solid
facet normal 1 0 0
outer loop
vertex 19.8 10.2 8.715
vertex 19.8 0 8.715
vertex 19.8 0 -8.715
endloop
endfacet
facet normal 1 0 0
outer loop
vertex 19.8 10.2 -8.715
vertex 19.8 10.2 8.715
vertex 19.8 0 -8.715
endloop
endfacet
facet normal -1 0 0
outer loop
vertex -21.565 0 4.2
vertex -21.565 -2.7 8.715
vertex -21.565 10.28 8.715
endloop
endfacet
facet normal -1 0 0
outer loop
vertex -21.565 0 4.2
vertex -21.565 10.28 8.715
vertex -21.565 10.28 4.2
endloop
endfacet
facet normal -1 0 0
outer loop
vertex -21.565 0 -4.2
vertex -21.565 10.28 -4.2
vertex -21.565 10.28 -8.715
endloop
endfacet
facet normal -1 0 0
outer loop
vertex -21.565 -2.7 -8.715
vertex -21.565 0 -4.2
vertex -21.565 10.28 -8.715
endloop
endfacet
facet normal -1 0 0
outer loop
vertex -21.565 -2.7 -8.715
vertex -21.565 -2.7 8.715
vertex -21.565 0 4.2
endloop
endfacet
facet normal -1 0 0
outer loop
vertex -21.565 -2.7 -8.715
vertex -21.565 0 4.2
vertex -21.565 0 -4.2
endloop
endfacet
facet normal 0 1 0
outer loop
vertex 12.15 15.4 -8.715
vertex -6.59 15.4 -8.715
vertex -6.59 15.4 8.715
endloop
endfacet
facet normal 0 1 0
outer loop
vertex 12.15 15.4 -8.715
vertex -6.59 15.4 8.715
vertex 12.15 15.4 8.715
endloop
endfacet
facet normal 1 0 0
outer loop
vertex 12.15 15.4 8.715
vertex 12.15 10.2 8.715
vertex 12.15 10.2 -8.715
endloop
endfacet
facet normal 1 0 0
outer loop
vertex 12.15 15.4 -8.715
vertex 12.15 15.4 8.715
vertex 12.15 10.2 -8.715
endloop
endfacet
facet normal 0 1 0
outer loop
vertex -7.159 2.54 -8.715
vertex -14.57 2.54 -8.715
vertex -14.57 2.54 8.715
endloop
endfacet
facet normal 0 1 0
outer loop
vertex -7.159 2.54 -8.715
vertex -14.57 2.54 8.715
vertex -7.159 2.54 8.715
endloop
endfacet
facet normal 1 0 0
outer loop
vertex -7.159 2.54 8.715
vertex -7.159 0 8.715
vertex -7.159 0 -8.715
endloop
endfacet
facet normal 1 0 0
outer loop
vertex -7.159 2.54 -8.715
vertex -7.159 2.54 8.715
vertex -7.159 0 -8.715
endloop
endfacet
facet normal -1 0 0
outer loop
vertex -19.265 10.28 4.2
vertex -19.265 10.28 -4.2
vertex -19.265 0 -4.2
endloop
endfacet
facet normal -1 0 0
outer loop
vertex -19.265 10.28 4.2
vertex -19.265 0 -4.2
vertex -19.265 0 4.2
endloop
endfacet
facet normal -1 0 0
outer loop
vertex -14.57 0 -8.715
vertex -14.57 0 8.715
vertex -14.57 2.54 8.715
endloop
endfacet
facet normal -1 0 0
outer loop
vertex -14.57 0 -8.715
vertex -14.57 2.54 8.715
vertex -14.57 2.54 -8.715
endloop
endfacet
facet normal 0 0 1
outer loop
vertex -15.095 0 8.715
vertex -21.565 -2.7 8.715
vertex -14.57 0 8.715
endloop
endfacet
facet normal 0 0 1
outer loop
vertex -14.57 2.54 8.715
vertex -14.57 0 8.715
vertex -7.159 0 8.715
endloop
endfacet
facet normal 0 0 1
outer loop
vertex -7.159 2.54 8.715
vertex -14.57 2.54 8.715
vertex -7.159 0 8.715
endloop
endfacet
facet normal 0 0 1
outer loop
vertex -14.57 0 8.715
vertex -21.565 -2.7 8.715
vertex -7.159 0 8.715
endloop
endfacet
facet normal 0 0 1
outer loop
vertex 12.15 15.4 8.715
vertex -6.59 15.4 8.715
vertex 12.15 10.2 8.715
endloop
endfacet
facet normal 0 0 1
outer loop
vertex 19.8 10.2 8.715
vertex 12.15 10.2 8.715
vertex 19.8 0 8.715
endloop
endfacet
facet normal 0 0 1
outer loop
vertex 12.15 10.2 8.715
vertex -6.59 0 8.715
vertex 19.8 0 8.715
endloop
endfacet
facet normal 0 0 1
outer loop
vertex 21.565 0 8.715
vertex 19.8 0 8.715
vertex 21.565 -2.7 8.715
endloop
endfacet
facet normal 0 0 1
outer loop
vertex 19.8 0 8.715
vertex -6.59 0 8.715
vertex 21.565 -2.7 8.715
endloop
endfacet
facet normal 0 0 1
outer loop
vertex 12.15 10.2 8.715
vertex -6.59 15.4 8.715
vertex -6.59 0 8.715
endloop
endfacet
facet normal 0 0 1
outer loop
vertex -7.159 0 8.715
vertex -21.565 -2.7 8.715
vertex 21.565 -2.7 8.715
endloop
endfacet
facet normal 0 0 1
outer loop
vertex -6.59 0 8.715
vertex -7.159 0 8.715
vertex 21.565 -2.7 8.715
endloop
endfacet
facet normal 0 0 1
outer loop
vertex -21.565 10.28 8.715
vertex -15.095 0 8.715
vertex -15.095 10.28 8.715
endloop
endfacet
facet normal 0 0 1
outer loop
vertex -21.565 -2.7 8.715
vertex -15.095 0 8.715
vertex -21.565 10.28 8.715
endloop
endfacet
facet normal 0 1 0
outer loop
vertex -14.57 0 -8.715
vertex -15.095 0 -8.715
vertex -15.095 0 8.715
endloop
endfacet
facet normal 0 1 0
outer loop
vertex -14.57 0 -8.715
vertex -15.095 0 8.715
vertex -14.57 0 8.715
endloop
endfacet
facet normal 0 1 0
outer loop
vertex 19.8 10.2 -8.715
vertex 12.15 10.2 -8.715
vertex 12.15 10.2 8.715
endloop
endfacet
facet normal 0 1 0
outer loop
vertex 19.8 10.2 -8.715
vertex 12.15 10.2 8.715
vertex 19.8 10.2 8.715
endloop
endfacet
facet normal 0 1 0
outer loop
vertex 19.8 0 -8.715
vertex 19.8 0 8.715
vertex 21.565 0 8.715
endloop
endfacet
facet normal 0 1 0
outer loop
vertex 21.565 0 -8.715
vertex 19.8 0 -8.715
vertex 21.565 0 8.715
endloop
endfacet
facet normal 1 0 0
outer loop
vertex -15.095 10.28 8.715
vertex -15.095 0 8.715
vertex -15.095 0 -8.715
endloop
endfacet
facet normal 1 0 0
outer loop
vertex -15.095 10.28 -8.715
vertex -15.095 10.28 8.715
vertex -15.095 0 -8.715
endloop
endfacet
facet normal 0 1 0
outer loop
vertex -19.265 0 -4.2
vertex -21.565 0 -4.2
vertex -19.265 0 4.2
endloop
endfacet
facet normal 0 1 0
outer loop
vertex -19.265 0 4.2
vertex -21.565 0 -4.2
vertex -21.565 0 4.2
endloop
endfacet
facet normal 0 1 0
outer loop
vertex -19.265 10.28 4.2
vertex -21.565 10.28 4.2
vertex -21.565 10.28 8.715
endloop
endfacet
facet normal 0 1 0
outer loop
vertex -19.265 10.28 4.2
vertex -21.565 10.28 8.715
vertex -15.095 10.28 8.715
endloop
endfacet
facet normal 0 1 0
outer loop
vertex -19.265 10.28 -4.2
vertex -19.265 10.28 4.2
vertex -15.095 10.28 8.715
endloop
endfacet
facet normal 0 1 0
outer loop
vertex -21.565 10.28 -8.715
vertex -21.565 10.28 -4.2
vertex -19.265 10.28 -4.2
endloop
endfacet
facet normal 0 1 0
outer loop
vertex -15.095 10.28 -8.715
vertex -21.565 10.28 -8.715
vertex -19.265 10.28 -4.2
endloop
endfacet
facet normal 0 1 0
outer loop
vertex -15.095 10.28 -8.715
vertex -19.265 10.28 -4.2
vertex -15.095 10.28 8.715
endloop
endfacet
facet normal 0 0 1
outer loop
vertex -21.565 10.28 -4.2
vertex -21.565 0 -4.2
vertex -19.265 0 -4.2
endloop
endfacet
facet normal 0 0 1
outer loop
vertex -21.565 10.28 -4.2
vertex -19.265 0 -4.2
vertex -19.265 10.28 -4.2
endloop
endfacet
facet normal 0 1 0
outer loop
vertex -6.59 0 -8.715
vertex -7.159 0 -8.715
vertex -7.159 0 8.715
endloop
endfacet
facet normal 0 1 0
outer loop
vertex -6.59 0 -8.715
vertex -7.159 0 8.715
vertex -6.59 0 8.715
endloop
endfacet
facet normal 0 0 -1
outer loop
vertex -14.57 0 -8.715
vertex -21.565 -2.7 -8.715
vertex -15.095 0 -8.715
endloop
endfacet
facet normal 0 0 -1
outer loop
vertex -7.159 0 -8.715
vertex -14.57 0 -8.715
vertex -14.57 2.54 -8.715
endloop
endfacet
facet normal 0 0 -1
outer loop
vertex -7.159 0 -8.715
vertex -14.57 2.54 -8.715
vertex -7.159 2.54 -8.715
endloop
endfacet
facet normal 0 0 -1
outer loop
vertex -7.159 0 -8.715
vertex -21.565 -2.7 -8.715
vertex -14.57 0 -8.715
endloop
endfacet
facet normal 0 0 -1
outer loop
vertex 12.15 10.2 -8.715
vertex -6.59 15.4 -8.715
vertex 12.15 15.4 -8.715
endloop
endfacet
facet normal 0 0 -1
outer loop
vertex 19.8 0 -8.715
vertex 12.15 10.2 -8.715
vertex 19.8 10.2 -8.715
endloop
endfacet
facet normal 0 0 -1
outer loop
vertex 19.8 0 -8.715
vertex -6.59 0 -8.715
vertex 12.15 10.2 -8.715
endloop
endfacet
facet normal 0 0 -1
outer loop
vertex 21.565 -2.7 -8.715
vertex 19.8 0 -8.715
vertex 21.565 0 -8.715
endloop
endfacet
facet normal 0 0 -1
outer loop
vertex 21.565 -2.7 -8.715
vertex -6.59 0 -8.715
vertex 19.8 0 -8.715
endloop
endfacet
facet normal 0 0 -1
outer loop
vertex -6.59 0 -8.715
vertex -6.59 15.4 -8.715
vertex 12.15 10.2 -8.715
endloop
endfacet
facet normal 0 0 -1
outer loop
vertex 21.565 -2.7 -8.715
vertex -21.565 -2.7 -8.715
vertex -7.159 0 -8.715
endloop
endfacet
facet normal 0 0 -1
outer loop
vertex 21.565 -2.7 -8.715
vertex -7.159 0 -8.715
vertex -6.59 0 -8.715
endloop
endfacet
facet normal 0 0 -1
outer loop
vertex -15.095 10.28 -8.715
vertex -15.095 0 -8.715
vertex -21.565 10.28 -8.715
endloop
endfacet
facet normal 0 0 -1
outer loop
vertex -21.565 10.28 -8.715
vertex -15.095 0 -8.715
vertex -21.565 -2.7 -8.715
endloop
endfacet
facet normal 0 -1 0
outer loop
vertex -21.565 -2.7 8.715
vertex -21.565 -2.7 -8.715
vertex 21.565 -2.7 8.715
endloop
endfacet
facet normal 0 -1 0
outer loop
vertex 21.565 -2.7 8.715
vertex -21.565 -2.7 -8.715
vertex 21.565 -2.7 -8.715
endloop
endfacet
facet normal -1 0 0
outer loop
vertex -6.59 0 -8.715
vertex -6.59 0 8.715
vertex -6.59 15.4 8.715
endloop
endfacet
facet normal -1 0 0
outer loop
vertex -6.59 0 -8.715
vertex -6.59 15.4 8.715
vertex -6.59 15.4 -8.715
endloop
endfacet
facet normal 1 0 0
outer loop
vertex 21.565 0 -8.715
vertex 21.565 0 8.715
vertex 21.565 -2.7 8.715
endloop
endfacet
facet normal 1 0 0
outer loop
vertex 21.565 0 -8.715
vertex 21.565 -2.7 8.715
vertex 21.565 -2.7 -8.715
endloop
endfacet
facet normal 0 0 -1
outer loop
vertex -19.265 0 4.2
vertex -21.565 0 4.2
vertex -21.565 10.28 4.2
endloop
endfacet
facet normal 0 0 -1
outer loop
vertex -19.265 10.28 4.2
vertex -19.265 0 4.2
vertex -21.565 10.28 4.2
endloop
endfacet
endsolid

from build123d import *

# Parameters (mm, degrees)
SKETCH1_W           = 43.13
SKETCH1_H           = 17.43
BOSS_EXTRUDE1_DEPTH = 2.7
SKETCH2_W           = 6.47
SKETCH2_H           = 17.43
BOSS_EXTRUDE2_DEPTH = 10.28
SKETCH3_W           = 7.65
SKETCH3_H           = 17.43
BOSS_EXTRUDE3_DEPTH = 10.2
SKETCH4_W           = 18.74
SKETCH4_H           = 17.43
BOSS_EXTRUDE4_DEPTH = 15.4
SKETCH5_W           = 7.411125452
SKETCH5_H           = 17.43
BOSS_EXTRUDE5_DEPTH = 2.54
SKETCH6_W           = 8.4
SKETCH6_H           = 10.28
CUT_EXTRUDE1_DEPTH  = 2.3


with BuildPart() as part:
    # Sketch1 → Boss-Extrude1 (new body)
    with BuildSketch(Plane(origin=(0, 0, 0), x_dir=(1, 0, 0), z_dir=(0, 1, 0))):
        Rectangle(SKETCH1_W, SKETCH1_H)
    extrude(amount=-BOSS_EXTRUDE1_DEPTH)

    # Sketch2 → Boss-Extrude2 (add)
    with BuildSketch(Plane(origin=(0, 0, 0), x_dir=(1, 0, 0), z_dir=(0, 1, 0))):
        with Locations((-18.33, 0)):
            Rectangle(SKETCH2_W, SKETCH2_H)
    extrude(amount=BOSS_EXTRUDE2_DEPTH)

    # Sketch3 → Boss-Extrude3 (add)
    with BuildSketch(Plane(origin=(0, 0, 0), x_dir=(1, 0, 0), z_dir=(0, 1, 0))):
        with Locations((15.975212475, 0)):
            Rectangle(SKETCH3_W, SKETCH3_H)
    extrude(amount=BOSS_EXTRUDE3_DEPTH)

    # Sketch4 → Boss-Extrude4 (add)
    with BuildSketch(Plane(origin=(0, 0, 0), x_dir=(1, 0, 0), z_dir=(0, 1, 0))):
        with Locations((2.780212475, 0)):
            Rectangle(SKETCH4_W, SKETCH4_H)
    extrude(amount=BOSS_EXTRUDE4_DEPTH)

    # Sketch5 → Boss-Extrude5 (add)
    with BuildSketch(Plane(origin=(0, 0, 0), x_dir=(1, 0, 0), z_dir=(0, 1, 0))):
        with Locations((-10.86460908, 0)):
            Rectangle(SKETCH5_W, SKETCH5_H)
    extrude(amount=BOSS_EXTRUDE5_DEPTH)

    # Sketch6 → Cut-Extrude1 (cut)
    with BuildSketch(Plane.ZY.offset(21.565)):
        with Locations((0, 5.14)):
            Rectangle(SKETCH6_W, SKETCH6_H)
    extrude(amount=-CUT_EXTRUDE1_DEPTH, mode=Mode.SUBTRACT)


solid = part.part
